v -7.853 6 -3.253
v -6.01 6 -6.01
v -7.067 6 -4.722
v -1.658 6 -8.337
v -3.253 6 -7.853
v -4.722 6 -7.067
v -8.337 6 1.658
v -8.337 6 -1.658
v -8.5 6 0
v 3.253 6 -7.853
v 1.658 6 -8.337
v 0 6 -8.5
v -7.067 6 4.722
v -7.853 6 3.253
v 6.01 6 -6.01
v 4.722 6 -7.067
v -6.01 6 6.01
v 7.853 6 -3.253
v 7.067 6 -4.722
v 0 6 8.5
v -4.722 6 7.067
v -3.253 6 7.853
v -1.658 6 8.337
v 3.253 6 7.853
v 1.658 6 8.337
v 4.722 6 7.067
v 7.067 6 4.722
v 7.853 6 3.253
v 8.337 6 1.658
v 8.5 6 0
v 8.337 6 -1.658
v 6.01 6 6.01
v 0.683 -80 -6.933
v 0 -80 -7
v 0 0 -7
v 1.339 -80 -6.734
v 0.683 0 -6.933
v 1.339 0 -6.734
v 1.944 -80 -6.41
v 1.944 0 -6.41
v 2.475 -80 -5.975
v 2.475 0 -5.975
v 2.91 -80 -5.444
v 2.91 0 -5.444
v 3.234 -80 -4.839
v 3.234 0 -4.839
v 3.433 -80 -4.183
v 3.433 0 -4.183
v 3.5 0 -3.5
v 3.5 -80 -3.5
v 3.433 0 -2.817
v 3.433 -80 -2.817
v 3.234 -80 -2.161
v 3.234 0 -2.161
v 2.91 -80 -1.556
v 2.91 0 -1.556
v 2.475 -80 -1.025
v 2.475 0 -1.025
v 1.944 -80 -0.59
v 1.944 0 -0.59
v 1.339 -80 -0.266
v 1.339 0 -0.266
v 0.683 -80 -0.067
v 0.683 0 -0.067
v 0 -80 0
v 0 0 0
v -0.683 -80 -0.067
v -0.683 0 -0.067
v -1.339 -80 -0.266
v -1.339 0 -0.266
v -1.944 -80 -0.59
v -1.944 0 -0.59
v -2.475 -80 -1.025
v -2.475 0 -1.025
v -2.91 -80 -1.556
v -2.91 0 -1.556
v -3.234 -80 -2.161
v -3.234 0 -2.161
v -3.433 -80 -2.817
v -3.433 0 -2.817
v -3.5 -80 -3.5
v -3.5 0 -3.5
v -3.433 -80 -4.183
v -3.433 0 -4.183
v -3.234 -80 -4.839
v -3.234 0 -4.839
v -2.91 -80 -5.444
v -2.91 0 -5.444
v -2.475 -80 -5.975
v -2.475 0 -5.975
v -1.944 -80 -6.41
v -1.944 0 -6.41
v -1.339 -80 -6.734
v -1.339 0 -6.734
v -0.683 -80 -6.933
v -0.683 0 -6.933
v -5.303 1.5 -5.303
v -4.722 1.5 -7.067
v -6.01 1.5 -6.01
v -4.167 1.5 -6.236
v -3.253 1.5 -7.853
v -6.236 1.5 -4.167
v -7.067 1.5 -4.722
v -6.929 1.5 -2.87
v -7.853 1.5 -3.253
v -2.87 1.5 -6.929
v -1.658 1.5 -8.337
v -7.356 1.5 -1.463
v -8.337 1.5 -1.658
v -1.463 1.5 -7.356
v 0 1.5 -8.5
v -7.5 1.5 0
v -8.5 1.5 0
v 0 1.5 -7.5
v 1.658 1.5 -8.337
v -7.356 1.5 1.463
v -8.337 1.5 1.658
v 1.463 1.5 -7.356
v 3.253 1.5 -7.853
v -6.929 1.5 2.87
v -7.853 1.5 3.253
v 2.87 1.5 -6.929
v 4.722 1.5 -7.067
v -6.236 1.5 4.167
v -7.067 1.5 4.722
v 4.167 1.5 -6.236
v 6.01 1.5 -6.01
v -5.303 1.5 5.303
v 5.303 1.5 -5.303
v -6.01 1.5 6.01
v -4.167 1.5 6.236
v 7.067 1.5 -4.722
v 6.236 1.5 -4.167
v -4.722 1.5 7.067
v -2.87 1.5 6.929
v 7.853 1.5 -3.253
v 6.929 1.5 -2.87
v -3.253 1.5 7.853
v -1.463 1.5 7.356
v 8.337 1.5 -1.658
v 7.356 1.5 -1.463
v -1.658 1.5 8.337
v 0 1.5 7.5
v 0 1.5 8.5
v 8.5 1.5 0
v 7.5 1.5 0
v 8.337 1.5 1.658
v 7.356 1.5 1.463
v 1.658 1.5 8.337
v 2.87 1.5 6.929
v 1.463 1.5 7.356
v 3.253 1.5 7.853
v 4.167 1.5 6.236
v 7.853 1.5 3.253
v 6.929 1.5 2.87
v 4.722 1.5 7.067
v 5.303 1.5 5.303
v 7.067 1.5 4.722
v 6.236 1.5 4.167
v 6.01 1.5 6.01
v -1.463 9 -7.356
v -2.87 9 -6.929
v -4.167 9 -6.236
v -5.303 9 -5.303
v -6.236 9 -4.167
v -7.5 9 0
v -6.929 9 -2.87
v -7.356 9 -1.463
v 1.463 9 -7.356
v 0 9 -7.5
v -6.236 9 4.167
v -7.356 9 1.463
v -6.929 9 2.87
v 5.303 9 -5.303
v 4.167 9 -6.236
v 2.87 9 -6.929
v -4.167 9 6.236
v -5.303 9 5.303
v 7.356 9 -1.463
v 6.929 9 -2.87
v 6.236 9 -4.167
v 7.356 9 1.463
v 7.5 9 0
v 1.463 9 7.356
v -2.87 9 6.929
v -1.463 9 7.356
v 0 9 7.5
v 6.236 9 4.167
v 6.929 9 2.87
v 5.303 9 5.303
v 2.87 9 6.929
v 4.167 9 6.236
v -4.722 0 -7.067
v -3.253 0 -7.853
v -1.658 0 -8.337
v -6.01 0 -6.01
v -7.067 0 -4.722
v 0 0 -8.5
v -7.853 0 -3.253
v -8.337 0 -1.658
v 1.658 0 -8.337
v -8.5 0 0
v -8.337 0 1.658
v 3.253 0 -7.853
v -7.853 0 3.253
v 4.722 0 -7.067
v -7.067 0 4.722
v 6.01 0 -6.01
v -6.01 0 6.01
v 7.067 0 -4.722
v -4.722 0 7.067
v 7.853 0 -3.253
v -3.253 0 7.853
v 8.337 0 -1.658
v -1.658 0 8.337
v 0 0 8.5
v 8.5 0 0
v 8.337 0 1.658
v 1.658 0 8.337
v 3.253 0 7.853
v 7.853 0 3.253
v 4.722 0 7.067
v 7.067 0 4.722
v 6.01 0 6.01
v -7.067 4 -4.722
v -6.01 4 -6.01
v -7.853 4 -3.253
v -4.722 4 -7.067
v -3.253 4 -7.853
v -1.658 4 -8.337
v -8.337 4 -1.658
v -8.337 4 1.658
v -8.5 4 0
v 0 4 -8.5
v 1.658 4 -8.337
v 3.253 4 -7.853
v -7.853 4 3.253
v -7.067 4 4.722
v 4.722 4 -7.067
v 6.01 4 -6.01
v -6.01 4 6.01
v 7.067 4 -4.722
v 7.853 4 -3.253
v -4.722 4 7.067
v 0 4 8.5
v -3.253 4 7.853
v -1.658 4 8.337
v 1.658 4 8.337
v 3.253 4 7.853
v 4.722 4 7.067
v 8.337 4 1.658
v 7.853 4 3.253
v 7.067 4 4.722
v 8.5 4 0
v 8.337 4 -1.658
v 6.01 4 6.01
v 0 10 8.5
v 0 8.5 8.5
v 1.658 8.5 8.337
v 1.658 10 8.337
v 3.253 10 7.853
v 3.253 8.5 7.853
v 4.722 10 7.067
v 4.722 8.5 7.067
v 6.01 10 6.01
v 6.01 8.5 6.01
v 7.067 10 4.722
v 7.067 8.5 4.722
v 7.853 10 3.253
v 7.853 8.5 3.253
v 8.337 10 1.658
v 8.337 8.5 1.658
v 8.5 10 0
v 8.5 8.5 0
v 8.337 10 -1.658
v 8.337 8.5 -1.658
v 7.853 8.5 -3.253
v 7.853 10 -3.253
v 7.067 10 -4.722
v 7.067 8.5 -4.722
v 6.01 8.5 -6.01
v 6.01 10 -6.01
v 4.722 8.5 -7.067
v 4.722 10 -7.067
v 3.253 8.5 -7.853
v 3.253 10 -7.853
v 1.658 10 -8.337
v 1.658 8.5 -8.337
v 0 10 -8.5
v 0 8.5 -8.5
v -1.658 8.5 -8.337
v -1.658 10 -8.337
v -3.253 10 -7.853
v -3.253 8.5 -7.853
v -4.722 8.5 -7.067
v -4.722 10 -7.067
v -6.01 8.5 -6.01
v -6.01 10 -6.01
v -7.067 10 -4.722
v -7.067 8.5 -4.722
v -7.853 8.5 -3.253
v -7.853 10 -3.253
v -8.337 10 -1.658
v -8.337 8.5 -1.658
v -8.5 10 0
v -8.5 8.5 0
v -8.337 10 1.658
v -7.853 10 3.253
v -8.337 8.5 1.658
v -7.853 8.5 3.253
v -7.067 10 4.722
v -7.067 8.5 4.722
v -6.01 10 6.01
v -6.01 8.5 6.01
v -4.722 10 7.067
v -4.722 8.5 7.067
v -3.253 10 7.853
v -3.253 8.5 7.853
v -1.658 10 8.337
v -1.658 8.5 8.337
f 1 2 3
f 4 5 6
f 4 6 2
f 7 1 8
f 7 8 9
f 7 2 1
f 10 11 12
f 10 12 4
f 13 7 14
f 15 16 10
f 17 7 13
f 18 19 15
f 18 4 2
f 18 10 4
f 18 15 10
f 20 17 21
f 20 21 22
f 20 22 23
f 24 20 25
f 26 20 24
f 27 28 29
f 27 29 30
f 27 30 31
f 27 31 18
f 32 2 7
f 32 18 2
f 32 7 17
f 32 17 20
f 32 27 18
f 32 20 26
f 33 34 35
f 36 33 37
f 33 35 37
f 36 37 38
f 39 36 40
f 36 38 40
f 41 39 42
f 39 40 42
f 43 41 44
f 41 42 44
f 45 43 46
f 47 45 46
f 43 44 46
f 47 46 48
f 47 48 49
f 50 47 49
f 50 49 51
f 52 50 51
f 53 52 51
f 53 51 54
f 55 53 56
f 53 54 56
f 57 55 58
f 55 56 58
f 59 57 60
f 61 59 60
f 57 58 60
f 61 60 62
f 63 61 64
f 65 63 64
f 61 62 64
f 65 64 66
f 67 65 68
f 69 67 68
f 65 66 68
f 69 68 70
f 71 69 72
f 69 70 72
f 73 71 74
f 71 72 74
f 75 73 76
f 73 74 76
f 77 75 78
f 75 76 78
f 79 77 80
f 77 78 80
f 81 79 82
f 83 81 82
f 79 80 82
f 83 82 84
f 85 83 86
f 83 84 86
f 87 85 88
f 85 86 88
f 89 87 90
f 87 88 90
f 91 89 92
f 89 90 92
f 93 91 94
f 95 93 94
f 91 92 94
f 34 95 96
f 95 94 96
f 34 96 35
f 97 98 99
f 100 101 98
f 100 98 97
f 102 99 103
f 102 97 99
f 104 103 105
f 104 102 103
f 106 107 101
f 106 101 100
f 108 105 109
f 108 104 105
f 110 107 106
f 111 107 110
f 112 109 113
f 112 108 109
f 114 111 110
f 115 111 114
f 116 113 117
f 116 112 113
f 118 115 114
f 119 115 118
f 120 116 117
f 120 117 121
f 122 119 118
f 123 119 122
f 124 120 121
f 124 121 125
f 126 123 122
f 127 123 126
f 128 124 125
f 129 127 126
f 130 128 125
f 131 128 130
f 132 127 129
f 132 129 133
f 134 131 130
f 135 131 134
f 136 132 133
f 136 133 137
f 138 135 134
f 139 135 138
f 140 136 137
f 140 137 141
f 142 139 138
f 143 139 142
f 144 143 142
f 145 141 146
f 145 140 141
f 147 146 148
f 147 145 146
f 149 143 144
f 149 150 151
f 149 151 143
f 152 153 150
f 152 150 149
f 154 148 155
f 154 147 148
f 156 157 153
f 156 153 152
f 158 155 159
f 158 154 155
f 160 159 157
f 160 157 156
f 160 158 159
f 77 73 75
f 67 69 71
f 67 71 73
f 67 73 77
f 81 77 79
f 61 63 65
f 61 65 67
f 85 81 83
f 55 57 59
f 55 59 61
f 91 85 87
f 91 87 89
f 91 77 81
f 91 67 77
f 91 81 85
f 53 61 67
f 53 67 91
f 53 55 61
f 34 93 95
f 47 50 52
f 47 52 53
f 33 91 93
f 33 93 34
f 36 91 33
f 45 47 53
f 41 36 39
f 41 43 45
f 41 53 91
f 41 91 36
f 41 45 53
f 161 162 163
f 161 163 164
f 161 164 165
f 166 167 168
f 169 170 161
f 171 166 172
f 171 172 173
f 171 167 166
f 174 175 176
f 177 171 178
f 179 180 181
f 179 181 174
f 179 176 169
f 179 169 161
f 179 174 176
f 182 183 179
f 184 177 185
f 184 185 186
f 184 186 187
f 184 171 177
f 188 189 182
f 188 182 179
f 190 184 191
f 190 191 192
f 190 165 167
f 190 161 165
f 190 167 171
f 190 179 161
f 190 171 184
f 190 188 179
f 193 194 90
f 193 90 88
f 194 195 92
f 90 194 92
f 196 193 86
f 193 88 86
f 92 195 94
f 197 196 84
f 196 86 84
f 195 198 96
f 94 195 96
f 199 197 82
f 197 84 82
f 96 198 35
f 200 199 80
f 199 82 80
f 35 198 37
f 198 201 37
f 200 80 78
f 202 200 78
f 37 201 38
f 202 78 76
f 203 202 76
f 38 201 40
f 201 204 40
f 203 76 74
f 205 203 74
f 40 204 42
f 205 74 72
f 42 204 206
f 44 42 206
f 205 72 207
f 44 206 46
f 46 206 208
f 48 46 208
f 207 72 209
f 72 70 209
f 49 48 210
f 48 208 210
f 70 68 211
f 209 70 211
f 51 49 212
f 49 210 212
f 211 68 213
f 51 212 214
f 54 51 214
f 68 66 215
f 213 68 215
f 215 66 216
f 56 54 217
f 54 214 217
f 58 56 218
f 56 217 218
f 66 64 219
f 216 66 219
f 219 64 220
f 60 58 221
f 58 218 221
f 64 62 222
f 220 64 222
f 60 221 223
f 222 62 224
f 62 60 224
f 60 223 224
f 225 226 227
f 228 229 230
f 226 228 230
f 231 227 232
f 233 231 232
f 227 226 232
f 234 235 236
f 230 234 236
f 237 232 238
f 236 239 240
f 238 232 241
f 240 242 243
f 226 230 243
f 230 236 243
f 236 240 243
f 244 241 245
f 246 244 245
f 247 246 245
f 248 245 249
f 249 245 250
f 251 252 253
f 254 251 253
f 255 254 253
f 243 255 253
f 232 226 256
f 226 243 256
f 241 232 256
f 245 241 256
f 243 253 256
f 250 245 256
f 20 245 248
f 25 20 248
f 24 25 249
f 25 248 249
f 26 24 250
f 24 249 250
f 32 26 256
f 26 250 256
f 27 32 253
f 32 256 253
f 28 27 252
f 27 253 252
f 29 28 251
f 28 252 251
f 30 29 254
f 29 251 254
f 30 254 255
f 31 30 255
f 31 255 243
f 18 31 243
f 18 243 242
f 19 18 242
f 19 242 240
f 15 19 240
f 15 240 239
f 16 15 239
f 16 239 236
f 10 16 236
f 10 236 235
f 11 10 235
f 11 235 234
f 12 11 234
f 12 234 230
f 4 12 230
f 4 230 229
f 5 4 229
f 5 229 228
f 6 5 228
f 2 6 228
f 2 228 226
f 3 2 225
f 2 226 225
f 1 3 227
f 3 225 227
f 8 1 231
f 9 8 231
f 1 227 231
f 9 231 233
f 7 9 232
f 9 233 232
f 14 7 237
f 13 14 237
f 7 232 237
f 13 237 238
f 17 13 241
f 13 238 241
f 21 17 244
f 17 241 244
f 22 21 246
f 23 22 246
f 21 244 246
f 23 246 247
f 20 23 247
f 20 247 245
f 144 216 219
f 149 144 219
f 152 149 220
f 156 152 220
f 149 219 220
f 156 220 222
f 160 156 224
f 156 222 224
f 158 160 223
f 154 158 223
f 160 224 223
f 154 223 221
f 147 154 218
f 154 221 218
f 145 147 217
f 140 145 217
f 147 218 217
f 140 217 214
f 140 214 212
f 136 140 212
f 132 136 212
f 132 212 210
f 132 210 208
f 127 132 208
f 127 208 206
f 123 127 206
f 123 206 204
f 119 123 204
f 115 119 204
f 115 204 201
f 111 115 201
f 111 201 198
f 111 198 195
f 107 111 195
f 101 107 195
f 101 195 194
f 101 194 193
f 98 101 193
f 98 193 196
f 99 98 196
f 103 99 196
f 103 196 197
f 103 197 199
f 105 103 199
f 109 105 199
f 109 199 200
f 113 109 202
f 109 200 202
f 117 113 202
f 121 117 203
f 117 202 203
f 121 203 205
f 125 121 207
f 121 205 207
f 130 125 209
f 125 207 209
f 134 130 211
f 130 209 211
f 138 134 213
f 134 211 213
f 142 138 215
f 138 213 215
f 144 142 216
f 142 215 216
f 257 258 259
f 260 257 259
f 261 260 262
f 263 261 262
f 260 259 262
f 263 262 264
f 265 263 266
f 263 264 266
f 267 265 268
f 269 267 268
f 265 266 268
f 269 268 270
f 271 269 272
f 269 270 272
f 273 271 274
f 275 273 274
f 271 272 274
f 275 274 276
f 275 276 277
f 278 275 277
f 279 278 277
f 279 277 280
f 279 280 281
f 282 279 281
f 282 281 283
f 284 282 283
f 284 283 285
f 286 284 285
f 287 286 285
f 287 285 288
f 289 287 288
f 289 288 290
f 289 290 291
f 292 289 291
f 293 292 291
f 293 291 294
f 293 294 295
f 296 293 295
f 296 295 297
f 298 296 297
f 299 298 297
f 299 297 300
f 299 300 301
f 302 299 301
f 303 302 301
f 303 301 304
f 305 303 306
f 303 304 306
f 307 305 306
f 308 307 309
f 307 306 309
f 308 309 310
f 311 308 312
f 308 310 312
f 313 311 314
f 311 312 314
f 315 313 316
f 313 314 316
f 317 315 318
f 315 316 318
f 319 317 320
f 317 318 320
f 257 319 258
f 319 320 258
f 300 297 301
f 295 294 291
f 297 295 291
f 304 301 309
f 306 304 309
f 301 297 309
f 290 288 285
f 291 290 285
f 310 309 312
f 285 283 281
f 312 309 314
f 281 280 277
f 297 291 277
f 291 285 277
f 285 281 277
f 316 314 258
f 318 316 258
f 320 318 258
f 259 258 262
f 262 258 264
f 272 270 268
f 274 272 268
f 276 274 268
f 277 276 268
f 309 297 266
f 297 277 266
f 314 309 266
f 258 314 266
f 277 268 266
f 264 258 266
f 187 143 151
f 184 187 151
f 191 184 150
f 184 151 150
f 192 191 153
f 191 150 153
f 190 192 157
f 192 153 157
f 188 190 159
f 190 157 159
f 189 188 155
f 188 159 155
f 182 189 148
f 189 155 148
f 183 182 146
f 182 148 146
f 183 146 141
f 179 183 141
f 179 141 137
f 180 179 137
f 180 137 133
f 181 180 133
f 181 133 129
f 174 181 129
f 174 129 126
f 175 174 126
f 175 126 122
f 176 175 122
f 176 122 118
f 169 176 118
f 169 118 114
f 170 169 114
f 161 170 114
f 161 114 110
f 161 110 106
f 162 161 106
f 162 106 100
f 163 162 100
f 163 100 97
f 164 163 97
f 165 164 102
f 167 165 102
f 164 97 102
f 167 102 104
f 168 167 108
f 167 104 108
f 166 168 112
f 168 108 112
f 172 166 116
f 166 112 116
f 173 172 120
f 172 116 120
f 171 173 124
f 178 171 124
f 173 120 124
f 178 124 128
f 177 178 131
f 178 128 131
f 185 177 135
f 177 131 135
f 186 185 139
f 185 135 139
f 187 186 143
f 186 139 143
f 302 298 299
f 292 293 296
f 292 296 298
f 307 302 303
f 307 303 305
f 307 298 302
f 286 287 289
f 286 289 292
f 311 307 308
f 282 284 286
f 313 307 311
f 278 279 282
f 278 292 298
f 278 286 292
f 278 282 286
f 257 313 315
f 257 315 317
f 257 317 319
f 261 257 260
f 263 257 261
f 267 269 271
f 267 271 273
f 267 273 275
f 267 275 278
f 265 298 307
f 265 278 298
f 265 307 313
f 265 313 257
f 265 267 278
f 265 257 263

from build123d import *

# Parameters (mm, degrees)
SKETCH2_R           = 8.5
BOSS_EXTRUDE1_DEPTH = 10
CUT_EXTRUDE1_START  = 1.5
SKETCH2_2_R         = 8.5
CUT_EXTRUDE1_DEPTH  = 2.5
CUT_EXTRUDE2_START  = 6
SKETCH2_3_R         = 8.5
CUT_EXTRUDE2_DEPTH  = 2.5
SKETCH4_R           = 7.5
BOSS_EXTRUDE3_DEPTH = 9
SKETCH5_R           = 3.5
BOSS_EXTRUDE4_DEPTH = 80


with BuildPart() as part:
    # Sketch2 → Boss-Extrude1 (new body)
    with BuildSketch(Plane(origin=(0, 0, 0), x_dir=(1, 0, 0), z_dir=(0, 1, 0))):
        with Locations(Location((0, 0, 0), (0, 0, 270))):
            Circle(SKETCH2_R)
    extrude(amount=BOSS_EXTRUDE1_DEPTH)

    # Sketch2<2> → Cut-Extrude1 (cut)
    with BuildSketch(Plane(origin=(0, 0, 0), x_dir=(1, 0, 0), z_dir=(0, 1, 0)).offset(CUT_EXTRUDE1_START)):
        with Locations(Location((0, 0, 0), (0, 0, 270))):
            Circle(SKETCH2_2_R)
    extrude(amount=CUT_EXTRUDE1_DEPTH, mode=Mode.SUBTRACT)


with BuildPart() as cut_extrude1_piece_1:
    # of the separate pieces the step leaves, piece 1, a body of its own (cut_extrude1_pieces)
    add(part.part.solids().sort_by_distance((0, 4, 8.5))[0])

    # Sketch2<3> → Cut-Extrude2 (cut)
    with BuildSketch(Plane(origin=(0, 0, 0), x_dir=(1, 0, 0), z_dir=(0, 1, 0)).offset(CUT_EXTRUDE2_START)):
        with Locations(Location((0, 0, 0), (0, 0, 270))):
            Circle(SKETCH2_3_R)
    extrude(amount=CUT_EXTRUDE2_DEPTH, mode=Mode.SUBTRACT)


with BuildPart() as cut_extrude1_piece_2:
    # of the separate pieces the step leaves, piece 2, a body of its own (cut_extrude1_pieces)
    add(part.part.solids().sort_by_distance((0, 0, 8.5))[0])

    # Sketch4 → Boss-Extrude3 (add)
    with BuildSketch(Plane(origin=(0, 0, 0), x_dir=(1, 0, 0), z_dir=(0, 1, 0))):
        with Locations(Location((0, 0, 0), (0, 0, 270))):
            Circle(SKETCH4_R)
    extrude(amount=BOSS_EXTRUDE3_DEPTH)

    # Sketch5 → Boss-Extrude4 (add)
    with BuildSketch(Plane.XZ):
        with Locations(Location((0, -3.5, 0), (0, 0, 270))):
            Circle(SKETCH5_R)
    extrude(amount=BOSS_EXTRUDE4_DEPTH)


with BuildPart() as cut_extrude2_piece_1:
    # of the separate pieces the step leaves, piece 1, a body of its own (cut_extrude2_pieces)
    add(cut_extrude1_piece_1.part.solids().sort_by_distance((0, 4, 8.5))[0])


with BuildPart() as cut_extrude2_piece_2:
    # of the separate pieces the step leaves, piece 2, a body of its own (cut_extrude2_pieces)
    add(cut_extrude1_piece_1.part.solids().sort_by_distance((0, 8.5, 8.5))[0])


solid = Compound([cut_extrude1_piece_2.part, cut_extrude2_piece_1.part, cut_extrude2_piece_2.part])
